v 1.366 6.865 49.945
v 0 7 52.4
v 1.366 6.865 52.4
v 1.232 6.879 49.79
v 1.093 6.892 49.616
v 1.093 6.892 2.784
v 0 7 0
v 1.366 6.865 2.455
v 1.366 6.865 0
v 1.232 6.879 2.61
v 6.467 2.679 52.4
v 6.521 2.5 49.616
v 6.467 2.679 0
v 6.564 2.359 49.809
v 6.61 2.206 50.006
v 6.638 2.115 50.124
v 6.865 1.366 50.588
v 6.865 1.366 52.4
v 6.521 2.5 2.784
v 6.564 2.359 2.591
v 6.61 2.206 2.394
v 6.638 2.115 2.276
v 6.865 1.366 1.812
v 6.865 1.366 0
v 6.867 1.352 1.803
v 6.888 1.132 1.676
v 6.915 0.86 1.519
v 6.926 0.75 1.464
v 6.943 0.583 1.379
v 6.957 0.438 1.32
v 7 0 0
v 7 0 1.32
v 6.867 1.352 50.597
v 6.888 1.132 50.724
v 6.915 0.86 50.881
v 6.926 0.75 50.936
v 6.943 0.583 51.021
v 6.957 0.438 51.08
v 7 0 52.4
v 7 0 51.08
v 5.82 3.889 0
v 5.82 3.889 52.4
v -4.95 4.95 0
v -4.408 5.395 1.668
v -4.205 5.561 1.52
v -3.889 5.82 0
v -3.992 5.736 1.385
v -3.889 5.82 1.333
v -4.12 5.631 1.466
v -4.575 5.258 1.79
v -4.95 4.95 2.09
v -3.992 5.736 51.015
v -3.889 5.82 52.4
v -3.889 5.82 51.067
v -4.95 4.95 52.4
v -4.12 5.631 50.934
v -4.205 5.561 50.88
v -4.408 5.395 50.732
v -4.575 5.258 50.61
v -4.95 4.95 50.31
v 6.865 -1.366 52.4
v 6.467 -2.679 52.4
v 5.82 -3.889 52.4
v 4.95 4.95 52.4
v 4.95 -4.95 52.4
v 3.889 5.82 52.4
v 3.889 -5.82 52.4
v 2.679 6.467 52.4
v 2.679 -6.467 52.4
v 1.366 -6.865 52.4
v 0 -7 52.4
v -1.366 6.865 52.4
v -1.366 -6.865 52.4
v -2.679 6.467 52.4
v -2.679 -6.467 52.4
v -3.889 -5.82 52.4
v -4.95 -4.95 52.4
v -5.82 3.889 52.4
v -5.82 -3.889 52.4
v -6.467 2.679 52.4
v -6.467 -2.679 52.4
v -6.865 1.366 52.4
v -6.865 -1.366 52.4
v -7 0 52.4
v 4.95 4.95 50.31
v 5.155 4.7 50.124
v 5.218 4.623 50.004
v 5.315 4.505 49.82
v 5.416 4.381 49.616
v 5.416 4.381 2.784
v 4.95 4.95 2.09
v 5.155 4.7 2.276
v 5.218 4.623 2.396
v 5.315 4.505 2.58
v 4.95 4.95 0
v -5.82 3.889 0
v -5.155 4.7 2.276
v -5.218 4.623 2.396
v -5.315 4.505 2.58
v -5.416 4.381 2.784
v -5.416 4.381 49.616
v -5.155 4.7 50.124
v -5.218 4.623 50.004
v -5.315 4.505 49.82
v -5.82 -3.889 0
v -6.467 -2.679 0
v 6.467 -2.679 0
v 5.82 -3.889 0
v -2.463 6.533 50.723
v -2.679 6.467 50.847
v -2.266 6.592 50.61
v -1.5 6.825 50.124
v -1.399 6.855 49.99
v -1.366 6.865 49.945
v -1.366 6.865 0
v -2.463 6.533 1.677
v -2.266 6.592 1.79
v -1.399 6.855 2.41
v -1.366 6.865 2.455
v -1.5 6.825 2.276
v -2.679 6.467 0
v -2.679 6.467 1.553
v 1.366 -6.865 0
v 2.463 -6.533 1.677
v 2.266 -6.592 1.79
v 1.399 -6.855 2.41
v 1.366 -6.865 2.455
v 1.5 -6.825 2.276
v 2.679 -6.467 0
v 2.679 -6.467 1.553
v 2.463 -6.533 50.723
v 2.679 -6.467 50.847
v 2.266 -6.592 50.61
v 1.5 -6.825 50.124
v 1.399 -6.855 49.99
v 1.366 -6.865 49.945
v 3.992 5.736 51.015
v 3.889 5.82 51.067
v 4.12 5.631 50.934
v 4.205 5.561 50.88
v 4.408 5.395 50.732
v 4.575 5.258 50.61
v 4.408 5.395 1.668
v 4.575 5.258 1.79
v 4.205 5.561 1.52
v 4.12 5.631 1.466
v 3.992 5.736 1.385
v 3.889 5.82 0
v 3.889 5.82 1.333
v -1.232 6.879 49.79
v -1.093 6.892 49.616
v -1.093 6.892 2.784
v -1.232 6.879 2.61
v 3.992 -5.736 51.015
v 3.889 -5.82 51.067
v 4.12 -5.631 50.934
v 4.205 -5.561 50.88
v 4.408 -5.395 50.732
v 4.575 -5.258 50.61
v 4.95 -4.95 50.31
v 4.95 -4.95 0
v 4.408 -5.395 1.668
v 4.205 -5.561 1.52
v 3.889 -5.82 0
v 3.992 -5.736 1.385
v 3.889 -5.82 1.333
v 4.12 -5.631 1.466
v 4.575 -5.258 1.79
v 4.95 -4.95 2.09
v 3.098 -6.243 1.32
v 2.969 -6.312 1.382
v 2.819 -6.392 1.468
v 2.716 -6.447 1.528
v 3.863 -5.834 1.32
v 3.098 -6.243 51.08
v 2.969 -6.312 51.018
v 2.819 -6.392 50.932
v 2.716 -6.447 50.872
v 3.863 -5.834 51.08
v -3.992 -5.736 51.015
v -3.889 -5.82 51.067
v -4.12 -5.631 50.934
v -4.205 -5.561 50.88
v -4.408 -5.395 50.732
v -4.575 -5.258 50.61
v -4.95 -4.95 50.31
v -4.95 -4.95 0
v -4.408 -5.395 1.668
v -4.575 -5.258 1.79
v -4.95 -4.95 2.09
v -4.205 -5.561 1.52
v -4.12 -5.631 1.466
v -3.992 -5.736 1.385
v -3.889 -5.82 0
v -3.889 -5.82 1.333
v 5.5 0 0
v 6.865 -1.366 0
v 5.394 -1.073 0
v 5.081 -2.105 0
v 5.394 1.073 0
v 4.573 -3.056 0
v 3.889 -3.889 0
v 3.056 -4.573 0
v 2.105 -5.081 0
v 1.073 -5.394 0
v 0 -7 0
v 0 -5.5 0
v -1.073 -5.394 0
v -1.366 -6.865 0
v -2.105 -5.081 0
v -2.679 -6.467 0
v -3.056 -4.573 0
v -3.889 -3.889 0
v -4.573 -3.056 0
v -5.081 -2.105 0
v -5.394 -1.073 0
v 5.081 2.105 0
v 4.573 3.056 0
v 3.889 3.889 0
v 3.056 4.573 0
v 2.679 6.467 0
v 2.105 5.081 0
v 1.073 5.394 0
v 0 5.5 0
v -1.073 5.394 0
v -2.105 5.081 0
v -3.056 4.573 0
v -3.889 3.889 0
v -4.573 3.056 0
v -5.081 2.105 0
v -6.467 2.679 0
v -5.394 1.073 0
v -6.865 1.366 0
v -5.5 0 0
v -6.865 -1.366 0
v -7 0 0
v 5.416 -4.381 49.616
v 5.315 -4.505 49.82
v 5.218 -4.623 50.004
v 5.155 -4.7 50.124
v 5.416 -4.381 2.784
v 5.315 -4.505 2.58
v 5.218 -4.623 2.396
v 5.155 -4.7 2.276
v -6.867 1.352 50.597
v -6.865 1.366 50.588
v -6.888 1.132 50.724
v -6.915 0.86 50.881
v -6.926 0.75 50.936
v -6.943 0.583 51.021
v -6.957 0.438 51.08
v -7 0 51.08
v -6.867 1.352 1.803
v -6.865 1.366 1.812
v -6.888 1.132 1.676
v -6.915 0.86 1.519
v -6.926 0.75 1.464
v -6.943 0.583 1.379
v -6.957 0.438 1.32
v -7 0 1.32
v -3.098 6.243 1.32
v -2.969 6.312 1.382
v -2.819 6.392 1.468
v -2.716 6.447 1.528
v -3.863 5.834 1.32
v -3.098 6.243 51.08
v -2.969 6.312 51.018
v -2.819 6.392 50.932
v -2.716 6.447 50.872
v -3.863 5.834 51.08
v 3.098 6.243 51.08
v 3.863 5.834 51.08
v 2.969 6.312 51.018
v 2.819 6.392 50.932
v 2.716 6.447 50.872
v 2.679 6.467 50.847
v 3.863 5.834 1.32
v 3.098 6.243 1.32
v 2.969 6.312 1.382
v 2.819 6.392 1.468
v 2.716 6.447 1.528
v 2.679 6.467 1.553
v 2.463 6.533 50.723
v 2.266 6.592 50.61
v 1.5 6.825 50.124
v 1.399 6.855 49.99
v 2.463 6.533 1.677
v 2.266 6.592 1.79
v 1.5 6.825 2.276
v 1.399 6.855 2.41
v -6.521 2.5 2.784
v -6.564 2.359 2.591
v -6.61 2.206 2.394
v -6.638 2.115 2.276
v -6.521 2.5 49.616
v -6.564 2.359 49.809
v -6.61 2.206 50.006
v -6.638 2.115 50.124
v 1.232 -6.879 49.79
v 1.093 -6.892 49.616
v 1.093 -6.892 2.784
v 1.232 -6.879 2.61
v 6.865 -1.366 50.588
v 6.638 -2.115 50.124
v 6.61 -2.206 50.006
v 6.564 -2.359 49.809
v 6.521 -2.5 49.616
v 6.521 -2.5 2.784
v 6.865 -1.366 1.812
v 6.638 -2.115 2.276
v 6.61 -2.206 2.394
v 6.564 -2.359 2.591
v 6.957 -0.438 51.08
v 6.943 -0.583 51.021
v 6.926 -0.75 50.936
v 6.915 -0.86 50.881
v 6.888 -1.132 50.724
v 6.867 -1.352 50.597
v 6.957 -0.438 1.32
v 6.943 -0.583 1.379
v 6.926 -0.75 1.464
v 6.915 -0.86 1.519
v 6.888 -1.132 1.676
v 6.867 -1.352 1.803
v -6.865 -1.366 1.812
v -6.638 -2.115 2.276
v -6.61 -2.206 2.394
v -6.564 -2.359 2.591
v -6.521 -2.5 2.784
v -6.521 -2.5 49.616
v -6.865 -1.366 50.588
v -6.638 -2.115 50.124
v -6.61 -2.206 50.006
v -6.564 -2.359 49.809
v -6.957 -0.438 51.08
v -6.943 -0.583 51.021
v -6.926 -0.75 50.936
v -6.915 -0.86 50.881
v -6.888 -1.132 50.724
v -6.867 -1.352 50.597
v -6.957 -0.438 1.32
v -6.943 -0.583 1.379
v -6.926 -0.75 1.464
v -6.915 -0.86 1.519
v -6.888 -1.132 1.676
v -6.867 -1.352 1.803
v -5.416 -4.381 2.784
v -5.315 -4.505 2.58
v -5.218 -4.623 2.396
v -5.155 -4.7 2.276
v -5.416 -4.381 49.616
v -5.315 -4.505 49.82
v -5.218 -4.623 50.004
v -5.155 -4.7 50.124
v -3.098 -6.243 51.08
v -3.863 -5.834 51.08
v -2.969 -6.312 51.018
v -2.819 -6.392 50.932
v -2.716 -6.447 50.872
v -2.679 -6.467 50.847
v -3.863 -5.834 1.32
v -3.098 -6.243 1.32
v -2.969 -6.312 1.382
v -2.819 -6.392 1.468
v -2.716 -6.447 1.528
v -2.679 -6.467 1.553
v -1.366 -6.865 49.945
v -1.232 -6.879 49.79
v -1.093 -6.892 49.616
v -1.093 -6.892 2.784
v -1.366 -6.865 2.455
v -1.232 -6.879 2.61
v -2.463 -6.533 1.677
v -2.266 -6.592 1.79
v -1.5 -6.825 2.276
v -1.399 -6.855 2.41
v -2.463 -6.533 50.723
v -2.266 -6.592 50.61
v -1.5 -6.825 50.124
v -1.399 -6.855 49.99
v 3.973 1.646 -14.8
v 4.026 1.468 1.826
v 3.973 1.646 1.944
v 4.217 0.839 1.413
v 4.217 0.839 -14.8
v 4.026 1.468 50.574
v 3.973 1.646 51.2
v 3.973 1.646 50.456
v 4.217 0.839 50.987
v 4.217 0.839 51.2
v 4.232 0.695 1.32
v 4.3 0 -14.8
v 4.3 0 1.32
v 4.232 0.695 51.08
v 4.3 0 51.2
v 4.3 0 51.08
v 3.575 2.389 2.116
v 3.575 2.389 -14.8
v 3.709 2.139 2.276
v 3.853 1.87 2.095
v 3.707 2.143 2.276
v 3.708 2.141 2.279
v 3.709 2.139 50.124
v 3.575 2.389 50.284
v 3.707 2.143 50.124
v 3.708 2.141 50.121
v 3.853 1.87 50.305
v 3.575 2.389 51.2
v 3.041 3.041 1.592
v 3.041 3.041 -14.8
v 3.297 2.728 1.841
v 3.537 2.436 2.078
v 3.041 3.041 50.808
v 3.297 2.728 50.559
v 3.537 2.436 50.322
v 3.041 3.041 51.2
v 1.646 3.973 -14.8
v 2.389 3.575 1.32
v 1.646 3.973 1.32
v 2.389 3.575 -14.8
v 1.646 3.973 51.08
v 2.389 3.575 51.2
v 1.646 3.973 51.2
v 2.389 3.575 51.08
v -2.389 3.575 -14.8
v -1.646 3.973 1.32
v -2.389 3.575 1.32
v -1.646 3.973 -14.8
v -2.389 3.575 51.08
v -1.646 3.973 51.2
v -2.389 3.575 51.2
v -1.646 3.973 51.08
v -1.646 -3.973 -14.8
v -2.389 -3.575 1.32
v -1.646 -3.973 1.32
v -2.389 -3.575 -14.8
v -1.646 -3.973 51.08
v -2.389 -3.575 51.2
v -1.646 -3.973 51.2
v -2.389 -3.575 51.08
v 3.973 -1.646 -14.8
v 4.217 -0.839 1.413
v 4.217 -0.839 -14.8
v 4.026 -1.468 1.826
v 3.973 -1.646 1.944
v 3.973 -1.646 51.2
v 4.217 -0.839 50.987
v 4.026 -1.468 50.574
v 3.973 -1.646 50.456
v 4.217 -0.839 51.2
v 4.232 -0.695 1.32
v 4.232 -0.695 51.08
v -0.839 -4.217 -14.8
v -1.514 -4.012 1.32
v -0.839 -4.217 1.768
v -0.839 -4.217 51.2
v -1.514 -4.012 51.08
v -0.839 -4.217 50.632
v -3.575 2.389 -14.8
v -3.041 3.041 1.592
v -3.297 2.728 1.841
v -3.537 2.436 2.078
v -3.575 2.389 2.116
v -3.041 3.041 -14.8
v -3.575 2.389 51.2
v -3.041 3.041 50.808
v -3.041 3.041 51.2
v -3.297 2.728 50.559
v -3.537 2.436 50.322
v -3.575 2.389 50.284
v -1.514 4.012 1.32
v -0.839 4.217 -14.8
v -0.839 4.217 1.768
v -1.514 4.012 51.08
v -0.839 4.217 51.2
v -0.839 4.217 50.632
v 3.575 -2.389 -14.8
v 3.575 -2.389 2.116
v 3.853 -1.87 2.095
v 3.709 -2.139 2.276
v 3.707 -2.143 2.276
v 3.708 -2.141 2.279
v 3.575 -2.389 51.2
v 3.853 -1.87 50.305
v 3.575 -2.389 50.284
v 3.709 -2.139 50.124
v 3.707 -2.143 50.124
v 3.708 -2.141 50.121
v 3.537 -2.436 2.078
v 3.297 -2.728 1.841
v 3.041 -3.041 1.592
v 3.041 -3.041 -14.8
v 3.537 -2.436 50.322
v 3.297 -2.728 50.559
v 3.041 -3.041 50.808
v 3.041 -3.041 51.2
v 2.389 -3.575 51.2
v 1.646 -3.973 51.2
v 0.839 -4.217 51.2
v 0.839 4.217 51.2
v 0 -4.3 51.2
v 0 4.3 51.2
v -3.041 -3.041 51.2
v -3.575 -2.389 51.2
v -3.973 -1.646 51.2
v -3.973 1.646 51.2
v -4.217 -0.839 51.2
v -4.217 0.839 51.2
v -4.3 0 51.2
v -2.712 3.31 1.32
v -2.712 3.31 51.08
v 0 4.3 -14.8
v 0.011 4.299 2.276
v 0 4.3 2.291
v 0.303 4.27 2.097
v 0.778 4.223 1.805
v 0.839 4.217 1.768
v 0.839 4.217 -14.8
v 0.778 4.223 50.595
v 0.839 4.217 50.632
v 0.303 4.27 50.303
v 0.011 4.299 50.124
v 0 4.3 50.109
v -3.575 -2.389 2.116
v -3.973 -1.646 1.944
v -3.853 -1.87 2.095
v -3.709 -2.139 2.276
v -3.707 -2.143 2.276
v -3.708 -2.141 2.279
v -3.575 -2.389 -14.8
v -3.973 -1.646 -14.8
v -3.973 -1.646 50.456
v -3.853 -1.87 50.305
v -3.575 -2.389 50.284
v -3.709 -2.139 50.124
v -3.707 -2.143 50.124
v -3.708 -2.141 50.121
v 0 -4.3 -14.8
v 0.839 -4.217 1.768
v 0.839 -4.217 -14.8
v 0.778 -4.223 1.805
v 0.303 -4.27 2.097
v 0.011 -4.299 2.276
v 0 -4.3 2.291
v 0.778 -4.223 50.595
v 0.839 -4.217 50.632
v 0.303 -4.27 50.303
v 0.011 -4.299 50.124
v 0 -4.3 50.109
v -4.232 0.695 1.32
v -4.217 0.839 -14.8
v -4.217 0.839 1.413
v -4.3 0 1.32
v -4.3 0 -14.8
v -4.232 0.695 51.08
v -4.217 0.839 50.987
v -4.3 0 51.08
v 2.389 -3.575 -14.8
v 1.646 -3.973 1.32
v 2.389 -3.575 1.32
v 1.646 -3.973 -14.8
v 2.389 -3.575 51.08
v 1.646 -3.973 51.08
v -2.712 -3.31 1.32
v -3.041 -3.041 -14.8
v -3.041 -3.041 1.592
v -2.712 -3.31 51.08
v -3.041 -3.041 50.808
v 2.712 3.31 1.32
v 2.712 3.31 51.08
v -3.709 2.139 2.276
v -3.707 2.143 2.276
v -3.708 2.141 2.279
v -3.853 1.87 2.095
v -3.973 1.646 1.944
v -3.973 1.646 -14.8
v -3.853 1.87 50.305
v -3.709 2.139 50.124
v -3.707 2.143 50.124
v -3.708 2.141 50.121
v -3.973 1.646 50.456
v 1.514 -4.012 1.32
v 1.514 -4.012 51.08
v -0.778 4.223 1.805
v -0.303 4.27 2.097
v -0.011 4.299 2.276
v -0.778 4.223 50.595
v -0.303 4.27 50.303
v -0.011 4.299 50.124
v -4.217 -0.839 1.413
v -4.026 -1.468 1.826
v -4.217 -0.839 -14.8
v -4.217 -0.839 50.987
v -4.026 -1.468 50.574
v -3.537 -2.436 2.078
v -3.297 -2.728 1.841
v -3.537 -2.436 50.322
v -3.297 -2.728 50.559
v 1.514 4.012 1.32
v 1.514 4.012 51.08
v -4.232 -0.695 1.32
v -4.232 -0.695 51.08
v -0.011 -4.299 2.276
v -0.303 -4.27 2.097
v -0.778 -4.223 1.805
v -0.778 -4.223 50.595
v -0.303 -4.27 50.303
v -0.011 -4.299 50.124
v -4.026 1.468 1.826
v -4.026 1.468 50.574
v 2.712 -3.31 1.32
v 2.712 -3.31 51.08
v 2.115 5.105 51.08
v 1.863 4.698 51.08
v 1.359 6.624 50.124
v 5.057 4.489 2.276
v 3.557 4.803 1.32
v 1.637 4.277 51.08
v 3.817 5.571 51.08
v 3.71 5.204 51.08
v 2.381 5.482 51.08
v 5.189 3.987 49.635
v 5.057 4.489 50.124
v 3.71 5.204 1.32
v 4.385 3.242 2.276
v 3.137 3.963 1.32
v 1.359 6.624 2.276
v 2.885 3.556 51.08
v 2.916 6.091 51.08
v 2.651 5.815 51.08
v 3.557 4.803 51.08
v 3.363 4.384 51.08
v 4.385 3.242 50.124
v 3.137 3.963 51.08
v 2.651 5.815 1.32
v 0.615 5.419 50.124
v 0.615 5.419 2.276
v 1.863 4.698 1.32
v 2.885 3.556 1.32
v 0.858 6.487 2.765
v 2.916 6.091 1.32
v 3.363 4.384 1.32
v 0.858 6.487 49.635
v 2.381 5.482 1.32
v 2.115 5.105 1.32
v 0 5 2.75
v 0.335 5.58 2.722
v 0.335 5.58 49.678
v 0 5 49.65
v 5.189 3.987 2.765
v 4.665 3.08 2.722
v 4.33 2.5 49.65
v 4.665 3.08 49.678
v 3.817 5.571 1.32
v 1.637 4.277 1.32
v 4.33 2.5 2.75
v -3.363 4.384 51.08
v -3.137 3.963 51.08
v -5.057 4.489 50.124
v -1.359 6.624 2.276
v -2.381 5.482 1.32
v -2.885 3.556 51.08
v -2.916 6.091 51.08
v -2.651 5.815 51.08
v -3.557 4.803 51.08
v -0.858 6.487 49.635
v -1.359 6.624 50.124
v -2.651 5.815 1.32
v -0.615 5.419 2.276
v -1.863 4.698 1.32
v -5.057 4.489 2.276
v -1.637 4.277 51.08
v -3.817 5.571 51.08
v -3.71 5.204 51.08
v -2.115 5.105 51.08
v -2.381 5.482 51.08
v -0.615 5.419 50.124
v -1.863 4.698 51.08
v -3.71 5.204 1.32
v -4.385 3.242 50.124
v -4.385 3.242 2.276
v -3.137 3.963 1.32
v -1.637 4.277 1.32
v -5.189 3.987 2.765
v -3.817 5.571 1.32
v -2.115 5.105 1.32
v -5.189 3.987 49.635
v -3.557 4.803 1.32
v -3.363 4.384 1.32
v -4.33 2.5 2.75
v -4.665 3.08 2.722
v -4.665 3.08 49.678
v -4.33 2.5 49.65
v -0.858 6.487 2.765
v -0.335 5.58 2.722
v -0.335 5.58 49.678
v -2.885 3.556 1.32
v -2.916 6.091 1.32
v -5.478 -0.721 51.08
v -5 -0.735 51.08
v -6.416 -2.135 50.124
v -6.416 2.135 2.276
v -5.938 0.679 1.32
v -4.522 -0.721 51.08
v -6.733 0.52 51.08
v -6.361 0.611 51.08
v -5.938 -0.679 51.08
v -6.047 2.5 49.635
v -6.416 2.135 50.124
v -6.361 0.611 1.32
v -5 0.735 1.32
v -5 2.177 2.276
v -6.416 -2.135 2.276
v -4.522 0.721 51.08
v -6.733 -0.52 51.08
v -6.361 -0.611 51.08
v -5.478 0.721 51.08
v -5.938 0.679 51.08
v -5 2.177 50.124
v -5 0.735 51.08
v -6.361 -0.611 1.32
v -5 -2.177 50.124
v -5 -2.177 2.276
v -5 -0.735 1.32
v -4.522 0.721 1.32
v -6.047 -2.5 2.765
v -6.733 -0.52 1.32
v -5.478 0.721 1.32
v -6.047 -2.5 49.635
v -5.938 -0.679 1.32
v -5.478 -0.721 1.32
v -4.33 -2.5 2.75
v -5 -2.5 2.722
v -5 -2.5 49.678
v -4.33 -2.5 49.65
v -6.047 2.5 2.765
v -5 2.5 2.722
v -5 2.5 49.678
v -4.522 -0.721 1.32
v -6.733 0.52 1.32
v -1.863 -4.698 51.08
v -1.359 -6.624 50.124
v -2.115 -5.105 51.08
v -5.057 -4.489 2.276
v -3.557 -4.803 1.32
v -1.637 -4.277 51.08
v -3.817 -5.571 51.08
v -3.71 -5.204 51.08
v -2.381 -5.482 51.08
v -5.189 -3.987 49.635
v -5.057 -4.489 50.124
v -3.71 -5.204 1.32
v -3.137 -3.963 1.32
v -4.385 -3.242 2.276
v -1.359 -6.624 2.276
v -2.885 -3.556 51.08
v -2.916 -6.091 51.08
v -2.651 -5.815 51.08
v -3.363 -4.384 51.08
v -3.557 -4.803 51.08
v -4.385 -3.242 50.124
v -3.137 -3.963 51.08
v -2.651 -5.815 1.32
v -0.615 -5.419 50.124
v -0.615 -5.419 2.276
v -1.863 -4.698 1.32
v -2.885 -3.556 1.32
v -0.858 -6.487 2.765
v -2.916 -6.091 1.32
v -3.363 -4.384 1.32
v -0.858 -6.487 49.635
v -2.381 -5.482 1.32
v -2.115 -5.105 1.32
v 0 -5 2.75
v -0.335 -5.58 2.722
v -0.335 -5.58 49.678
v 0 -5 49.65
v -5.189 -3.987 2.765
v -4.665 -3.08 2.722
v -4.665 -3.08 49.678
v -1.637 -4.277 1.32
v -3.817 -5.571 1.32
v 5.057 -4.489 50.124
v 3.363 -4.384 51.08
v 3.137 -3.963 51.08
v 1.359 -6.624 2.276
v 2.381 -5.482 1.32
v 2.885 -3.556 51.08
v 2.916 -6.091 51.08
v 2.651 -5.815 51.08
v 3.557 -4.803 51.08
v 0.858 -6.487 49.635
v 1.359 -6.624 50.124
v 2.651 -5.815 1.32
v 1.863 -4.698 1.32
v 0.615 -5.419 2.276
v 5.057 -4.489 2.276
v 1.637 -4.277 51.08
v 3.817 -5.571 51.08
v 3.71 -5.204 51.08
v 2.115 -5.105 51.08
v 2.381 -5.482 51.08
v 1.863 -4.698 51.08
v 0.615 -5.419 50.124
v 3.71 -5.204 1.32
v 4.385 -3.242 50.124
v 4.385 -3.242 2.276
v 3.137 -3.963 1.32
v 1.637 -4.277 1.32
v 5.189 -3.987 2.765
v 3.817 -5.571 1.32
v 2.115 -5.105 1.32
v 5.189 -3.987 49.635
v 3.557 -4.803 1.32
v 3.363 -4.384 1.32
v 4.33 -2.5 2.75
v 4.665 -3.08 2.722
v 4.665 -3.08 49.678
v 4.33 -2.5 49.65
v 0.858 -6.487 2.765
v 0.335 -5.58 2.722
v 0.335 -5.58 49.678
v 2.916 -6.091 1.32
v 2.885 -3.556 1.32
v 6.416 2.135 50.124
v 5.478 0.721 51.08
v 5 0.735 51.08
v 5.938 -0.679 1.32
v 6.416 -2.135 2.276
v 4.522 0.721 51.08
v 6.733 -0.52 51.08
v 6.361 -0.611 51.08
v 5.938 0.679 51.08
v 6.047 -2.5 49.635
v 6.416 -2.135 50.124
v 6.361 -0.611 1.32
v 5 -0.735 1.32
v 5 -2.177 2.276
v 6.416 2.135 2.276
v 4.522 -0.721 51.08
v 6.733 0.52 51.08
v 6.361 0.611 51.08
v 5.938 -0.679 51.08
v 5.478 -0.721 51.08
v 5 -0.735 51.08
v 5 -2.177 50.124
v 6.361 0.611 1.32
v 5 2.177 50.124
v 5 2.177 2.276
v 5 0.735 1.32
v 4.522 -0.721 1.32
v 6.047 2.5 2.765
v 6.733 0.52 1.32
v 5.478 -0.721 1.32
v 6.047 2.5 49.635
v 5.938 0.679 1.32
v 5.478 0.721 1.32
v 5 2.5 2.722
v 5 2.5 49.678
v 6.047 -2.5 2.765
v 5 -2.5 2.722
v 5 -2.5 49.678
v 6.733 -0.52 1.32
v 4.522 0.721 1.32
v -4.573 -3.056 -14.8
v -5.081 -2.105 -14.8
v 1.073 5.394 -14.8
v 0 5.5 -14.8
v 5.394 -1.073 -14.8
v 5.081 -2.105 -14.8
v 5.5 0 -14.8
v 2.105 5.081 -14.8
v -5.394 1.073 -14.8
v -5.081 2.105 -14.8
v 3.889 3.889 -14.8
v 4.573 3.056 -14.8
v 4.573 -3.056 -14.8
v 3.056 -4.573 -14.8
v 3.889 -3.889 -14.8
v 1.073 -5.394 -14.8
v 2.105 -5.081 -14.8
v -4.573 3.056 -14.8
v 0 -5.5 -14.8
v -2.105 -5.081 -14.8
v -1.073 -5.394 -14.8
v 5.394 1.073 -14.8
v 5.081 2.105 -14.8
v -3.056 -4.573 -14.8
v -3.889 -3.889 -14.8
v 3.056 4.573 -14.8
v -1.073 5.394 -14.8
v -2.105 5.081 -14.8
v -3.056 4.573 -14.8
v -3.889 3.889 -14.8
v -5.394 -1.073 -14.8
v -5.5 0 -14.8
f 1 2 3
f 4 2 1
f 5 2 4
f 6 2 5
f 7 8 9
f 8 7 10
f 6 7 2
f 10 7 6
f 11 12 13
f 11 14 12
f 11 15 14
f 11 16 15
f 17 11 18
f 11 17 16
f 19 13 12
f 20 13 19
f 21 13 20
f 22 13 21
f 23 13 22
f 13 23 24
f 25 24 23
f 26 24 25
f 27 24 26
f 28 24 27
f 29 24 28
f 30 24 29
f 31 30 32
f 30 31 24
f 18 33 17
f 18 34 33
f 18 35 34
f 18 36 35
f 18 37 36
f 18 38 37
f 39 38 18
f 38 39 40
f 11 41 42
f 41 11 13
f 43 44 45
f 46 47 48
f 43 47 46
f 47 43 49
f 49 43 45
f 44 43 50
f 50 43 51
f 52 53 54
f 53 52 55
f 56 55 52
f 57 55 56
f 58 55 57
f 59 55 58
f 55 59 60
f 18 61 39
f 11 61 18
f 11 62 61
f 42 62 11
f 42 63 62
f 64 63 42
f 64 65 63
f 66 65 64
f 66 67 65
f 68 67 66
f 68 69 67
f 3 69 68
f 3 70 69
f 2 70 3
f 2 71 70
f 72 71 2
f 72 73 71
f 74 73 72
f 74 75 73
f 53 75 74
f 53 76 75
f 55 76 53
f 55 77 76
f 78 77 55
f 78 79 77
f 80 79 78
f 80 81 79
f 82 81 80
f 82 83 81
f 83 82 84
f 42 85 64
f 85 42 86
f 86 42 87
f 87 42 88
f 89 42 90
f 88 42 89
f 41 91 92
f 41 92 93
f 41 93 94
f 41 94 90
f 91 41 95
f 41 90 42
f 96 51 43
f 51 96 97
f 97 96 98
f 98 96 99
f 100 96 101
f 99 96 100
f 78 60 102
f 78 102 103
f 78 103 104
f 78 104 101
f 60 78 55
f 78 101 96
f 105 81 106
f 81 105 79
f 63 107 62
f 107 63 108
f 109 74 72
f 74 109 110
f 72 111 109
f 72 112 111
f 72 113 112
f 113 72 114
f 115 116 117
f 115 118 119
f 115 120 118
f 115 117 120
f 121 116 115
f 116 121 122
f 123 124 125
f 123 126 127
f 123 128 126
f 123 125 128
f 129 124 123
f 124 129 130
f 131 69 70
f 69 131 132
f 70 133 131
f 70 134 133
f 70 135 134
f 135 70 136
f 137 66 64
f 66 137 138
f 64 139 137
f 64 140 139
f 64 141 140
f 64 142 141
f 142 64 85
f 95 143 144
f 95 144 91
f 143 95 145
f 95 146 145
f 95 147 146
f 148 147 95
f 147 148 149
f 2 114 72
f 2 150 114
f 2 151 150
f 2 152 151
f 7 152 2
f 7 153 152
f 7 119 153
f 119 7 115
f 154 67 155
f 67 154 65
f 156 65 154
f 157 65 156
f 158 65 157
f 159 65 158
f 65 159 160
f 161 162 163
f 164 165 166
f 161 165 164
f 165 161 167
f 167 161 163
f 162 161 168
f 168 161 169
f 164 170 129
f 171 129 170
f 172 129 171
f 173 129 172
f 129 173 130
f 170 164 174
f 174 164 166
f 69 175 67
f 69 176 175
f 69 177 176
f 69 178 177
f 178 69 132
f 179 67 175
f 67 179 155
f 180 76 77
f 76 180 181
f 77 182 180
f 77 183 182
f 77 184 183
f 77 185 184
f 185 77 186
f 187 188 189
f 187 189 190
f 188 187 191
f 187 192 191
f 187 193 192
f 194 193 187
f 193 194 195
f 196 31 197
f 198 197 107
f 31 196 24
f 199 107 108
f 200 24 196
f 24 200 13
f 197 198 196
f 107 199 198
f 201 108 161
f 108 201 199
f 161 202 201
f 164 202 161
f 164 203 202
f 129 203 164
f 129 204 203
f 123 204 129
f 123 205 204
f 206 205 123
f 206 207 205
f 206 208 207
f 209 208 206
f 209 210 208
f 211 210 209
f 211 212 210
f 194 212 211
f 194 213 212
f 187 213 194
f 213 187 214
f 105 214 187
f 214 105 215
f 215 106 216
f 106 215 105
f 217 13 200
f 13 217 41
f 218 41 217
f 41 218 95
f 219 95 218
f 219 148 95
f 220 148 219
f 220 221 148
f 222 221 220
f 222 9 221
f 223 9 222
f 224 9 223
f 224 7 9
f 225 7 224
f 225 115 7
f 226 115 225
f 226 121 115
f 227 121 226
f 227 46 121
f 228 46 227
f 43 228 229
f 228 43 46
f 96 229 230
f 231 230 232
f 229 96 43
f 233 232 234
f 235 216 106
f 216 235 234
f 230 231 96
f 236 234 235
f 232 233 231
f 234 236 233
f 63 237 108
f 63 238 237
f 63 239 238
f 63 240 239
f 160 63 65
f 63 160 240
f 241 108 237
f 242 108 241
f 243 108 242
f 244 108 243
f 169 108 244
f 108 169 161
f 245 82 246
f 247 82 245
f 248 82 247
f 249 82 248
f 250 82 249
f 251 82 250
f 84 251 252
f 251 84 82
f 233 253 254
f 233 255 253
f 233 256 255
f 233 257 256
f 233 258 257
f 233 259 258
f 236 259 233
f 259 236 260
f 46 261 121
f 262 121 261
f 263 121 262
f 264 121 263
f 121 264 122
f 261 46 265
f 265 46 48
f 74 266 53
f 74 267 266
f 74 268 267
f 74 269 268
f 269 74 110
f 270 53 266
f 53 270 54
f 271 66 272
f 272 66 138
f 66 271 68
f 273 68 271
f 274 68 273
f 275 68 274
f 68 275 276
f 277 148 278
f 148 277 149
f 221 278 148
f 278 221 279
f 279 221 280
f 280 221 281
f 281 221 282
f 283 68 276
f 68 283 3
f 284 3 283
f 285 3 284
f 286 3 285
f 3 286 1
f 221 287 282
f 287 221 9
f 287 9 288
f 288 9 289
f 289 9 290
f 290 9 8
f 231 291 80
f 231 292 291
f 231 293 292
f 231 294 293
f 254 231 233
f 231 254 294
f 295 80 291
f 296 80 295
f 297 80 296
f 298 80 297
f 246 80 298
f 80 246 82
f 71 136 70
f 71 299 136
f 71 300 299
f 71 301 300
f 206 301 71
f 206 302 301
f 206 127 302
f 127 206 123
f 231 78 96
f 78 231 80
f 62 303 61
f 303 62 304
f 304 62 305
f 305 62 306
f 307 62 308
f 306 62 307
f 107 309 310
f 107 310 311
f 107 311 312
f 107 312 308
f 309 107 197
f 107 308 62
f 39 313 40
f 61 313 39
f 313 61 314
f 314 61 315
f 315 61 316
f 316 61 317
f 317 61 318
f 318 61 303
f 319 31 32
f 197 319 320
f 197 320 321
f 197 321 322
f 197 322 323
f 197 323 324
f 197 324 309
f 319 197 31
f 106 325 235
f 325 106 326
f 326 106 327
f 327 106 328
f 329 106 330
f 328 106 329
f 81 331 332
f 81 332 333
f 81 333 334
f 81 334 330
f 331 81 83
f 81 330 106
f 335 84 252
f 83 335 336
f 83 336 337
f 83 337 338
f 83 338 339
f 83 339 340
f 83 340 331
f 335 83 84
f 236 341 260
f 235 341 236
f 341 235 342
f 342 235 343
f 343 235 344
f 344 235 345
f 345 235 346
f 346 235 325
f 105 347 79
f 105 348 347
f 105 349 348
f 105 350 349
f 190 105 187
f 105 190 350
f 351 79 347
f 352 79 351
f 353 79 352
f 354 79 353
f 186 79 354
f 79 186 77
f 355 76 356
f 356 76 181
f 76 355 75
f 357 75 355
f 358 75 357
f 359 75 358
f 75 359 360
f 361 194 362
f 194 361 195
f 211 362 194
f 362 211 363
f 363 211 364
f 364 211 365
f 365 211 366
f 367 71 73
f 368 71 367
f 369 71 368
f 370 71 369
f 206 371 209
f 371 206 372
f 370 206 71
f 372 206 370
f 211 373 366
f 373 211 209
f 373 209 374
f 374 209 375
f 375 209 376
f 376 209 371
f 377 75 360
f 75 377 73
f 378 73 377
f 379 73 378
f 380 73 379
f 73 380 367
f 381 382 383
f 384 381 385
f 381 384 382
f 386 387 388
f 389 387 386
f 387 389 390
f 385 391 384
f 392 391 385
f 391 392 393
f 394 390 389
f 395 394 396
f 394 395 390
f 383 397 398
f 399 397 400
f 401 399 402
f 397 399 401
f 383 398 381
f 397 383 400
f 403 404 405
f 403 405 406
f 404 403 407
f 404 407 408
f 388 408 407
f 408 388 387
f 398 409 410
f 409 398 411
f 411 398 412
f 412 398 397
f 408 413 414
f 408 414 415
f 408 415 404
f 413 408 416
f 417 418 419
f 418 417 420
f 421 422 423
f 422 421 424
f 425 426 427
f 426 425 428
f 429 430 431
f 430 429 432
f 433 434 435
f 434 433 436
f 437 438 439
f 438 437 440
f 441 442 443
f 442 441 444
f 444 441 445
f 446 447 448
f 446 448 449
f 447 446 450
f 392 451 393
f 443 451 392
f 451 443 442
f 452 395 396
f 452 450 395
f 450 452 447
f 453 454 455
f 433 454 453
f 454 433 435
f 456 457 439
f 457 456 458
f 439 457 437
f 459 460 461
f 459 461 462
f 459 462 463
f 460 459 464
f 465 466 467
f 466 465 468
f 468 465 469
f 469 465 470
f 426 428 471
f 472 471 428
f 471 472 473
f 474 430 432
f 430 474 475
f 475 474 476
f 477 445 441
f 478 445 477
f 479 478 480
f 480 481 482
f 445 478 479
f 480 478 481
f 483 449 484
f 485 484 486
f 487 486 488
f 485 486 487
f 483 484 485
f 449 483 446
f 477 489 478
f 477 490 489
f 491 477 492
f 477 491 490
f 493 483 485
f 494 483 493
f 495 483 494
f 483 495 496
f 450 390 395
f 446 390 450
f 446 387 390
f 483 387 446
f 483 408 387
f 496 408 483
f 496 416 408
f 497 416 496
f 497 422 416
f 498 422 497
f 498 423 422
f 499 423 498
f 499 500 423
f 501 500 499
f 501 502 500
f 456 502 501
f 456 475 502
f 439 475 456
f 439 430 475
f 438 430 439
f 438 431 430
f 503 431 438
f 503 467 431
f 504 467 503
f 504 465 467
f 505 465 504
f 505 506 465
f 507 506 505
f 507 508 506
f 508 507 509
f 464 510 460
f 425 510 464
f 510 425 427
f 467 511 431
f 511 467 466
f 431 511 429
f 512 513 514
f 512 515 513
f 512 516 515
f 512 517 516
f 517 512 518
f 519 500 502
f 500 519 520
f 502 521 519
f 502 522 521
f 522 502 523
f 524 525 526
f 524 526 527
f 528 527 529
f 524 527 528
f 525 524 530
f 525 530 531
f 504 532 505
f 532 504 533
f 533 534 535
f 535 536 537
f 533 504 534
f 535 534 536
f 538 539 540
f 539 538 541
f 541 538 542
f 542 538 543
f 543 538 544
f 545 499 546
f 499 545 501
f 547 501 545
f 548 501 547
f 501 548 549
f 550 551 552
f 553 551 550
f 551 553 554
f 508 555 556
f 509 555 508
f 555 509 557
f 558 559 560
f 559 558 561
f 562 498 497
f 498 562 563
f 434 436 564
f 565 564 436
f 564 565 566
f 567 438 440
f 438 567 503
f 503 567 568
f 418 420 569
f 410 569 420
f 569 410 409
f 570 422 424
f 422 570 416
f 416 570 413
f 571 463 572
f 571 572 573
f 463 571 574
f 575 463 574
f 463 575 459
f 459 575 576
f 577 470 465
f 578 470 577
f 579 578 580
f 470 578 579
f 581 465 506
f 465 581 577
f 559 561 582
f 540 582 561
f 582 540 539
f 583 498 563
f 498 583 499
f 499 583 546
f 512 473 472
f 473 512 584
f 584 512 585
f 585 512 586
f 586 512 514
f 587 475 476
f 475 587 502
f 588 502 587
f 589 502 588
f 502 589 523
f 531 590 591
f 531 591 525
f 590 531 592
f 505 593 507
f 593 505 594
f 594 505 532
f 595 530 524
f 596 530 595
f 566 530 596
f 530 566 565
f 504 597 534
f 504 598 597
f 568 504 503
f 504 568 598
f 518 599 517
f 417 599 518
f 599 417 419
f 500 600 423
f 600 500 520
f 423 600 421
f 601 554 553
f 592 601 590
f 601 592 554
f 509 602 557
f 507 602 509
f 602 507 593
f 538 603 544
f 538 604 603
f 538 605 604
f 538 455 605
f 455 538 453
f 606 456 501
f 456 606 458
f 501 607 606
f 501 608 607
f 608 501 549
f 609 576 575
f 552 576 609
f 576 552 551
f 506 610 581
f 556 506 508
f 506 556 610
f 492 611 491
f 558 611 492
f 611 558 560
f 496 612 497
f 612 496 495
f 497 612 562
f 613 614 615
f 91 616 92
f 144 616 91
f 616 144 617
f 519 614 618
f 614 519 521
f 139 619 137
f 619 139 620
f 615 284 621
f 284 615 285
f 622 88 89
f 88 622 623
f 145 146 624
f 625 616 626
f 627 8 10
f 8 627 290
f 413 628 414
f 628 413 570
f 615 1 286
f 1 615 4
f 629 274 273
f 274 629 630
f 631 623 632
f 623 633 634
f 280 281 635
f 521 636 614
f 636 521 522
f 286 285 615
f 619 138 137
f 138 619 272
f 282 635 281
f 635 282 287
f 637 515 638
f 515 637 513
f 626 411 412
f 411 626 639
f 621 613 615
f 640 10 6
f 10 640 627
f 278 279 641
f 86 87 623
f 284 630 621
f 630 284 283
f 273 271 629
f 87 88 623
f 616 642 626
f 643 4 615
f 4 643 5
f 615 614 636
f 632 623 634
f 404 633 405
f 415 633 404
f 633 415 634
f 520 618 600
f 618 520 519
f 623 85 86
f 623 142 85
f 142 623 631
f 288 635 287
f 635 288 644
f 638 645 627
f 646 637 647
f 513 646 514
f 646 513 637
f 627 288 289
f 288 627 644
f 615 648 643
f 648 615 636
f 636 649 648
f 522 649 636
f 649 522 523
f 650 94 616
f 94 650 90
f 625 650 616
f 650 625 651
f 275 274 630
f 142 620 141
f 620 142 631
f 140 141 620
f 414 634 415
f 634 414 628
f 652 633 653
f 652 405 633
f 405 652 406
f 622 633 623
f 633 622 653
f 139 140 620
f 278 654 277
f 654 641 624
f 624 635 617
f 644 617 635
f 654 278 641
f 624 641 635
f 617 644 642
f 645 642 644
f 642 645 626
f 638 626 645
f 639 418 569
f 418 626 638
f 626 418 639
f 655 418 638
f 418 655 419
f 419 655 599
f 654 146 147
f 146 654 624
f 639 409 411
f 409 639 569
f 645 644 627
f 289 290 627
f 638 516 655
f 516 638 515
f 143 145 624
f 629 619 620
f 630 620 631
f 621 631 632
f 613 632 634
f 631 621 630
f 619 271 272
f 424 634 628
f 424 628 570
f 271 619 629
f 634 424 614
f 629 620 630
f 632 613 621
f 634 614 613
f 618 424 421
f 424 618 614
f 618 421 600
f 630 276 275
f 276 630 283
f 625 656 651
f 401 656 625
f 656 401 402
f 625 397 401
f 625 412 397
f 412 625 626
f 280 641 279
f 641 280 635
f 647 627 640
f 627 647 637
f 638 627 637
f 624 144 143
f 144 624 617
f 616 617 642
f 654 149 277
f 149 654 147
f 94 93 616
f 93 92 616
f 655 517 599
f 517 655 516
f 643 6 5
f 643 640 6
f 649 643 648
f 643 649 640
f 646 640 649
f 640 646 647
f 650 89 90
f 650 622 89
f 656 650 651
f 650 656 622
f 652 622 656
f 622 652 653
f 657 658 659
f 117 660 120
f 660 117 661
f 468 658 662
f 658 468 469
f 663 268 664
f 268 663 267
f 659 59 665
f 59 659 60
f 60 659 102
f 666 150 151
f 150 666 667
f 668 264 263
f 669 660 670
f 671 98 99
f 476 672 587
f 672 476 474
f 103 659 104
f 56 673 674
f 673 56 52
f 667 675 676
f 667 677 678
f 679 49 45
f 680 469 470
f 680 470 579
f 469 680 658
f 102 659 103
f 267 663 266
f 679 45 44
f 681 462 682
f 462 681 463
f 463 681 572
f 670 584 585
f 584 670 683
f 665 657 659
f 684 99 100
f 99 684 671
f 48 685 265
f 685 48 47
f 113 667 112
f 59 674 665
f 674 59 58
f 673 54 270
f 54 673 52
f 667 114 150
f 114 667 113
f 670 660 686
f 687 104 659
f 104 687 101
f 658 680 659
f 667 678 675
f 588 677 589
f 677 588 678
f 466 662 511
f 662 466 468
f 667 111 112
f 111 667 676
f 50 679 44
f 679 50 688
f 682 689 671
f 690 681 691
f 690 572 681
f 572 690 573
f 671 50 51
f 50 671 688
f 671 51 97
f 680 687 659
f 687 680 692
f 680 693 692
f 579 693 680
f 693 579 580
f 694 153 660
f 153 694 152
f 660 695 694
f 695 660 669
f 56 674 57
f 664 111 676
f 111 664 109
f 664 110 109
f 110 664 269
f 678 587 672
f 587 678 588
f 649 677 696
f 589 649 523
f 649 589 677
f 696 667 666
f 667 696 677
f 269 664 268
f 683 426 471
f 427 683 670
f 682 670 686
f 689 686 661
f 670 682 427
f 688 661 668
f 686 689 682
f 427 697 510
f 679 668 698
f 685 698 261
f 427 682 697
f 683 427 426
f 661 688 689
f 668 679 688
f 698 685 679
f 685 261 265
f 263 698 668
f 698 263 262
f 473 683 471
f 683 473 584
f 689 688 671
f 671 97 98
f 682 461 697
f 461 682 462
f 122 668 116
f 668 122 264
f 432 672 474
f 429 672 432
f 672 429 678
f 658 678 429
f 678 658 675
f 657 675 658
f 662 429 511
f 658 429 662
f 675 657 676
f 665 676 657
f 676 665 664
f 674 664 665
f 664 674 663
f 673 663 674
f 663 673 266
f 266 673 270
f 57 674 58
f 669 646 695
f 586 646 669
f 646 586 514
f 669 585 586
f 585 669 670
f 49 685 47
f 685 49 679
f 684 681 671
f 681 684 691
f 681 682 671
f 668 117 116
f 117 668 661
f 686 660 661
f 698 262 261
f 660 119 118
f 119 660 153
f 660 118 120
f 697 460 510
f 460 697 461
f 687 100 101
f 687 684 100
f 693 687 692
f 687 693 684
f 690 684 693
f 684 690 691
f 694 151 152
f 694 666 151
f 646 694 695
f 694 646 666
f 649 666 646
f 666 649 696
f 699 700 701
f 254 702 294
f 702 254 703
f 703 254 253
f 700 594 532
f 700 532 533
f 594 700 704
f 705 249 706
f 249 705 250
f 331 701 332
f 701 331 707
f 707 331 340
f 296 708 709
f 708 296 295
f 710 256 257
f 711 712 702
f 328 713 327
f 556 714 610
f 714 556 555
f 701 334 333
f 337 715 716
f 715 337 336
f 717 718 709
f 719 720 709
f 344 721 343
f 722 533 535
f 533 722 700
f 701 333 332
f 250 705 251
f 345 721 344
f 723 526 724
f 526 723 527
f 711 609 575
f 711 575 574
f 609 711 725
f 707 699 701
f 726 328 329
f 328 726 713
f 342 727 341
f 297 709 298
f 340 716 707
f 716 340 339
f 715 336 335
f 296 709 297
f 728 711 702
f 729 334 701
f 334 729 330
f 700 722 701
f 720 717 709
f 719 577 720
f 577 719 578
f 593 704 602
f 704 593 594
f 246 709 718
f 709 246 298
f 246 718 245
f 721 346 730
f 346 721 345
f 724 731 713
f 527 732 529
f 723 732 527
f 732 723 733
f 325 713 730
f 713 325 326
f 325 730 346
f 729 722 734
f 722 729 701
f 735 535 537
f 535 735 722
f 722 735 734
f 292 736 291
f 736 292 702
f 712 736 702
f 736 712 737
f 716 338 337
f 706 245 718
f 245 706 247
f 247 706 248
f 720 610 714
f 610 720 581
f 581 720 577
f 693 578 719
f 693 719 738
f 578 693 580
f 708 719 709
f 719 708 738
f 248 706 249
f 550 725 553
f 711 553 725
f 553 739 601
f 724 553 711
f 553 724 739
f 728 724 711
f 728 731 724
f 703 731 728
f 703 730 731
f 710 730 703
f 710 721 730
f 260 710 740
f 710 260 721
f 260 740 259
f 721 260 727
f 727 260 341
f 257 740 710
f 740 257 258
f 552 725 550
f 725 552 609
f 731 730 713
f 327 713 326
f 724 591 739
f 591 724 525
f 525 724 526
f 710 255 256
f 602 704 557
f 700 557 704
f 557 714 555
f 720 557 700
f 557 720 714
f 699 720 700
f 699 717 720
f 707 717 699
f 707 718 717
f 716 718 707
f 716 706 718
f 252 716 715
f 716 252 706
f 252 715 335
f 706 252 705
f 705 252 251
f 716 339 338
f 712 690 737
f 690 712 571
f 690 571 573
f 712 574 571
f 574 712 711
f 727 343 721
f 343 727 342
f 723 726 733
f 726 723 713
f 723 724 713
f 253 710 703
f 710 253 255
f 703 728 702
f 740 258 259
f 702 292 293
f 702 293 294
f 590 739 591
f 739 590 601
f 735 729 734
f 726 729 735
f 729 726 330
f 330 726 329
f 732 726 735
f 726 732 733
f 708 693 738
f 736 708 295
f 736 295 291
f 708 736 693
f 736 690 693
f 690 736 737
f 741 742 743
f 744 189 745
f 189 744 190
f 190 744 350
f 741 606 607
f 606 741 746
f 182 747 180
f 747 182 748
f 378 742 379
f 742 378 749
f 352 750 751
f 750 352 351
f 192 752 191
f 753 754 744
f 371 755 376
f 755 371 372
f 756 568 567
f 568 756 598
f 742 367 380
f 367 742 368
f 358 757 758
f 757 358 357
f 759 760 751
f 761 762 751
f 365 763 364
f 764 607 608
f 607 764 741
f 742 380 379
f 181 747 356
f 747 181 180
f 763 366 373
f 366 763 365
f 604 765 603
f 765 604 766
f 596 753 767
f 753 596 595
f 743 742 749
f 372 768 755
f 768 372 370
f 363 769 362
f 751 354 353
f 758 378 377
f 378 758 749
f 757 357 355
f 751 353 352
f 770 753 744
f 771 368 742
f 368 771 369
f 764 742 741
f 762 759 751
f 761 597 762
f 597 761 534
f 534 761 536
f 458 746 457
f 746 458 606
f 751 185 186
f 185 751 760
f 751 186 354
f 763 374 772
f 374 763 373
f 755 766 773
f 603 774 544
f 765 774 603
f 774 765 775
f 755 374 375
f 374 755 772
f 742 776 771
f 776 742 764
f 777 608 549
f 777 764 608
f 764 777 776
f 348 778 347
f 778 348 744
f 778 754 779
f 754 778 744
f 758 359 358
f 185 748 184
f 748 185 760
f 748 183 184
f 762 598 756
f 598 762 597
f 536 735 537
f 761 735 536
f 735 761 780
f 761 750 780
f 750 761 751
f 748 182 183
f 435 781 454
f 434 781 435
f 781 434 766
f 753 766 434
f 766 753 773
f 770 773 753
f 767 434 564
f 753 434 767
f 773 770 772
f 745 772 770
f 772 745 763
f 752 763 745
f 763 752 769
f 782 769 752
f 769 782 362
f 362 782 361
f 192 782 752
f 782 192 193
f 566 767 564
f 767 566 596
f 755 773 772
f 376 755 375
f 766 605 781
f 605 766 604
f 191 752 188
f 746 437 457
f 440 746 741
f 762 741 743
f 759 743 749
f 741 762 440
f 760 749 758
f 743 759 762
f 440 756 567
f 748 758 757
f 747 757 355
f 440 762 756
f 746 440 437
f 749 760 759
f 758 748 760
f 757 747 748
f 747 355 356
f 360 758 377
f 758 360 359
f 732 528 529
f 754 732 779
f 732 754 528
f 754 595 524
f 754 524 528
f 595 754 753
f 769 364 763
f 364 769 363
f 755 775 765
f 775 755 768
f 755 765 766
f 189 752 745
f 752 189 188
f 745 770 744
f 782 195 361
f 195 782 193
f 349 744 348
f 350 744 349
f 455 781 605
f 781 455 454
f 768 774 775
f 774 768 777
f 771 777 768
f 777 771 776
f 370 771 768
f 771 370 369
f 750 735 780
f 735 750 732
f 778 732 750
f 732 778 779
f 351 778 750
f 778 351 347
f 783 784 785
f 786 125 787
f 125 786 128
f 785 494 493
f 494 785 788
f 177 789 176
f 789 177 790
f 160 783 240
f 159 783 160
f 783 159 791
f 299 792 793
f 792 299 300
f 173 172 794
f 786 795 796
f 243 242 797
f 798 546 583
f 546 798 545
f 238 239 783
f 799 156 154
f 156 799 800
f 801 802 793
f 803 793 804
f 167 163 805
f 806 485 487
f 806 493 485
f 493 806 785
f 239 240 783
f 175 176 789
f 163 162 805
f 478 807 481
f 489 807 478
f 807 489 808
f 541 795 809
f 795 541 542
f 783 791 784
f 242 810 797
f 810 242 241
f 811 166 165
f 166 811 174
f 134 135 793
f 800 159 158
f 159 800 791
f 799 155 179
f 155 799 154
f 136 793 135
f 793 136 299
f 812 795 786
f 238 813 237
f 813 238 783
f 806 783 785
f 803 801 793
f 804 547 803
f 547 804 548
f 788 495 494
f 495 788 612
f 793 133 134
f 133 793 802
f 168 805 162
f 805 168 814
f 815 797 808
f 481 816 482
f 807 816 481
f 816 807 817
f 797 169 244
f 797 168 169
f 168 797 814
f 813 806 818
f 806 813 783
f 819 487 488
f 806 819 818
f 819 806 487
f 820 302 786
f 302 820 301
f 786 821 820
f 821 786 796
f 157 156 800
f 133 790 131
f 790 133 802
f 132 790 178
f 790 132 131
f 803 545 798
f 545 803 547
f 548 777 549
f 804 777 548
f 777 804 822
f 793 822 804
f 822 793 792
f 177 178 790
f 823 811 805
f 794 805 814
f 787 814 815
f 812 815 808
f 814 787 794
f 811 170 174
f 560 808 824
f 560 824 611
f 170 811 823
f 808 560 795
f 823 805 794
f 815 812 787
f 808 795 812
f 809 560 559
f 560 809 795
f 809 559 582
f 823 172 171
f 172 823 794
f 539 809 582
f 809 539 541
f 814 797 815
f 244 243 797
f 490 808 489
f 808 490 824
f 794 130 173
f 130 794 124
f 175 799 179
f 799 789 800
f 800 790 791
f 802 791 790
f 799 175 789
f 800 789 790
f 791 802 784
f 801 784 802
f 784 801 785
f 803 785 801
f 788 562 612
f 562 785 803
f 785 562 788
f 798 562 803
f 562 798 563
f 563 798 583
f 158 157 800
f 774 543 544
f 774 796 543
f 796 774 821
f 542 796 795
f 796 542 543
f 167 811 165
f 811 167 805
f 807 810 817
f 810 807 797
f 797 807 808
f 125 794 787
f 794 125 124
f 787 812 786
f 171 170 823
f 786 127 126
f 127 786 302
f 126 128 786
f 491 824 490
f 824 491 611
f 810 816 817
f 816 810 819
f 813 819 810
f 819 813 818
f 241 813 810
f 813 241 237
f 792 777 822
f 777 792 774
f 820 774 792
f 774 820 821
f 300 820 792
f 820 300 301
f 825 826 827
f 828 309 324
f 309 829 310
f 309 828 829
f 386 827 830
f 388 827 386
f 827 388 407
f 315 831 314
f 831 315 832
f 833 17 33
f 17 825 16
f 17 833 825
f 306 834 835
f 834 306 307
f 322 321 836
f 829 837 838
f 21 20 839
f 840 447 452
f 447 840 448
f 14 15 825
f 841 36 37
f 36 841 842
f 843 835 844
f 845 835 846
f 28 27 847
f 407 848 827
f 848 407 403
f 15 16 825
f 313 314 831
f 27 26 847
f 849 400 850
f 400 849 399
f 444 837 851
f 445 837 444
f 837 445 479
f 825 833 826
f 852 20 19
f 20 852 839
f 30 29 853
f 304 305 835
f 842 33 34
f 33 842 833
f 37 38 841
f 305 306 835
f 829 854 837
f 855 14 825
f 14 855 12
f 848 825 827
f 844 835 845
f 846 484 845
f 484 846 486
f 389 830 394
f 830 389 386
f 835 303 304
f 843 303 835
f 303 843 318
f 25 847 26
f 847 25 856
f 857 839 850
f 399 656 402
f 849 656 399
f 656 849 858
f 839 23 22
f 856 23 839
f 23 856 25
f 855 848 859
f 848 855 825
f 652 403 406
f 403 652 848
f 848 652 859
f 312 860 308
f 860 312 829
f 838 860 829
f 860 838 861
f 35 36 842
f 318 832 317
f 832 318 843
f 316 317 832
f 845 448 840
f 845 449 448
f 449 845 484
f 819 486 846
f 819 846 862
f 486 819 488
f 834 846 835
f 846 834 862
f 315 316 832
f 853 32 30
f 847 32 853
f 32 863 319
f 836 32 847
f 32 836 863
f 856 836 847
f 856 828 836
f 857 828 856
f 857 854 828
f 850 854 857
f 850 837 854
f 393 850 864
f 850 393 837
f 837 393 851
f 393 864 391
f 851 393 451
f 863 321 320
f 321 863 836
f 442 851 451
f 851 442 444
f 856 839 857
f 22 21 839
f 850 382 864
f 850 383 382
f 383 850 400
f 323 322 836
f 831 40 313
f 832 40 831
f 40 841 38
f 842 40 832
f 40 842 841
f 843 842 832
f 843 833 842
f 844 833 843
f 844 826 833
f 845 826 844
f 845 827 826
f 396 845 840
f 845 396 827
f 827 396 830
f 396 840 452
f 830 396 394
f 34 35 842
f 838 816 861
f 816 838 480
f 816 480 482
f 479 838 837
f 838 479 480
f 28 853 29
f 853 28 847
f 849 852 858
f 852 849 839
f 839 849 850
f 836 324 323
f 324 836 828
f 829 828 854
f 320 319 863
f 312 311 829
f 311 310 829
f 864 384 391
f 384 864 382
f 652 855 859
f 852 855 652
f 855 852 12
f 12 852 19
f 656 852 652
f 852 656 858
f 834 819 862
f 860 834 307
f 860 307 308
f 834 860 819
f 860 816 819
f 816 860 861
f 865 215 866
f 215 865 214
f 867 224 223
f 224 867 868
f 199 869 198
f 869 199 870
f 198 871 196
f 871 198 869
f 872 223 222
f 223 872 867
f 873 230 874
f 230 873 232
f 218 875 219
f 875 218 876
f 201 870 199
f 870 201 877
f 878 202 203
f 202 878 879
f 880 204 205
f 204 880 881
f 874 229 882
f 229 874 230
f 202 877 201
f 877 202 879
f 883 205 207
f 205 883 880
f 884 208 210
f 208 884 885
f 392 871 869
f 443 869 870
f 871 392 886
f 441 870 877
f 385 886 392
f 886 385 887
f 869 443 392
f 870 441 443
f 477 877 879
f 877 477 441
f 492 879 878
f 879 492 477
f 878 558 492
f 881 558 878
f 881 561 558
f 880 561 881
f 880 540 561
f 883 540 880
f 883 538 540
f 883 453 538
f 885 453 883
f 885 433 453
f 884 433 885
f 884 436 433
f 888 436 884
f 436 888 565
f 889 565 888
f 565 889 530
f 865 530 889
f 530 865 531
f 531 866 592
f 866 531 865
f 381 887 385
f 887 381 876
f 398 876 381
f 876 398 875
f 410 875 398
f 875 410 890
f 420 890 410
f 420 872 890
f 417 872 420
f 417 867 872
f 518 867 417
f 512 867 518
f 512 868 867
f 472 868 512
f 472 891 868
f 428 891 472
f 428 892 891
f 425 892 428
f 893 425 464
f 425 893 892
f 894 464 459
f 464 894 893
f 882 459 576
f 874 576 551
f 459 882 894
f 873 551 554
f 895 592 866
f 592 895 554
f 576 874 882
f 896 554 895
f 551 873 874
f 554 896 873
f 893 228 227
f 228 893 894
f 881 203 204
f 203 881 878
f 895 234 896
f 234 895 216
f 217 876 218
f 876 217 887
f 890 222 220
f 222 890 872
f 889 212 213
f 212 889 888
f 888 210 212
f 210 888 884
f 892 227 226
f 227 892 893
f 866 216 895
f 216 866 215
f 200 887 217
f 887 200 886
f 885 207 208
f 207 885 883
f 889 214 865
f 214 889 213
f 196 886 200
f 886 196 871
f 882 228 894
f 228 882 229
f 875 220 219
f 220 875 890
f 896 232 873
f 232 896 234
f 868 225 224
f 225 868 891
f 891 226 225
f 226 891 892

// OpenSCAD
/* [Straw Config] */

// Outer diameter of the straw being placed on, in mm.
straw_outer_diameter = 11.6;

// Thickness of the straw's material, in mm.
straw_thickness = 0.3;

/* [Dimensions] */

// Thickness of the part, in mm.
thickness = 1.2;

// Height of the window (not counting part thickness), in mm. This is about as much as the inner indicator is expected to move, with some extra.
window_height = 50;

// Number of windows rotated around the straw.
windows = 6;

// Size of each window, in mm.
window_thickness = 5;

// Length of part to be inserted into straw, in mm.
insert_height = 16;

/* [Expert] */

// Quality
$fn=32;

union(){
    difference(){
        difference(){
            cylinder(h = window_height+2*thickness, d=straw_outer_diameter+2*thickness, center=false);
            cylinder(h = window_height+thickness, d1=straw_outer_diameter-2*straw_thickness-2*thickness, d2=straw_outer_diameter-2*straw_thickness-2*thickness, center=false);
        }

        for(i=[1:windows])
            rotate([0, 0, i*360/windows])
                intersection(){
                    translate([window_thickness, 0, thickness+window_height/2])
                        scale([1,0.3,1])
                            sphere(d = window_height);
                    translate([0, -window_thickness/2, thickness])
                        cube([10, window_thickness, window_height]);
                }
    }

    translate([0, 0, thickness])
        rotate([180, 0, 0]) {
            difference(){
                cylinder(h = insert_height, d=straw_outer_diameter-2*straw_thickness, center=false);
                cylinder(h = insert_height, d=straw_outer_diameter-2*straw_thickness-2*thickness, center=false);
            }
        }
}
